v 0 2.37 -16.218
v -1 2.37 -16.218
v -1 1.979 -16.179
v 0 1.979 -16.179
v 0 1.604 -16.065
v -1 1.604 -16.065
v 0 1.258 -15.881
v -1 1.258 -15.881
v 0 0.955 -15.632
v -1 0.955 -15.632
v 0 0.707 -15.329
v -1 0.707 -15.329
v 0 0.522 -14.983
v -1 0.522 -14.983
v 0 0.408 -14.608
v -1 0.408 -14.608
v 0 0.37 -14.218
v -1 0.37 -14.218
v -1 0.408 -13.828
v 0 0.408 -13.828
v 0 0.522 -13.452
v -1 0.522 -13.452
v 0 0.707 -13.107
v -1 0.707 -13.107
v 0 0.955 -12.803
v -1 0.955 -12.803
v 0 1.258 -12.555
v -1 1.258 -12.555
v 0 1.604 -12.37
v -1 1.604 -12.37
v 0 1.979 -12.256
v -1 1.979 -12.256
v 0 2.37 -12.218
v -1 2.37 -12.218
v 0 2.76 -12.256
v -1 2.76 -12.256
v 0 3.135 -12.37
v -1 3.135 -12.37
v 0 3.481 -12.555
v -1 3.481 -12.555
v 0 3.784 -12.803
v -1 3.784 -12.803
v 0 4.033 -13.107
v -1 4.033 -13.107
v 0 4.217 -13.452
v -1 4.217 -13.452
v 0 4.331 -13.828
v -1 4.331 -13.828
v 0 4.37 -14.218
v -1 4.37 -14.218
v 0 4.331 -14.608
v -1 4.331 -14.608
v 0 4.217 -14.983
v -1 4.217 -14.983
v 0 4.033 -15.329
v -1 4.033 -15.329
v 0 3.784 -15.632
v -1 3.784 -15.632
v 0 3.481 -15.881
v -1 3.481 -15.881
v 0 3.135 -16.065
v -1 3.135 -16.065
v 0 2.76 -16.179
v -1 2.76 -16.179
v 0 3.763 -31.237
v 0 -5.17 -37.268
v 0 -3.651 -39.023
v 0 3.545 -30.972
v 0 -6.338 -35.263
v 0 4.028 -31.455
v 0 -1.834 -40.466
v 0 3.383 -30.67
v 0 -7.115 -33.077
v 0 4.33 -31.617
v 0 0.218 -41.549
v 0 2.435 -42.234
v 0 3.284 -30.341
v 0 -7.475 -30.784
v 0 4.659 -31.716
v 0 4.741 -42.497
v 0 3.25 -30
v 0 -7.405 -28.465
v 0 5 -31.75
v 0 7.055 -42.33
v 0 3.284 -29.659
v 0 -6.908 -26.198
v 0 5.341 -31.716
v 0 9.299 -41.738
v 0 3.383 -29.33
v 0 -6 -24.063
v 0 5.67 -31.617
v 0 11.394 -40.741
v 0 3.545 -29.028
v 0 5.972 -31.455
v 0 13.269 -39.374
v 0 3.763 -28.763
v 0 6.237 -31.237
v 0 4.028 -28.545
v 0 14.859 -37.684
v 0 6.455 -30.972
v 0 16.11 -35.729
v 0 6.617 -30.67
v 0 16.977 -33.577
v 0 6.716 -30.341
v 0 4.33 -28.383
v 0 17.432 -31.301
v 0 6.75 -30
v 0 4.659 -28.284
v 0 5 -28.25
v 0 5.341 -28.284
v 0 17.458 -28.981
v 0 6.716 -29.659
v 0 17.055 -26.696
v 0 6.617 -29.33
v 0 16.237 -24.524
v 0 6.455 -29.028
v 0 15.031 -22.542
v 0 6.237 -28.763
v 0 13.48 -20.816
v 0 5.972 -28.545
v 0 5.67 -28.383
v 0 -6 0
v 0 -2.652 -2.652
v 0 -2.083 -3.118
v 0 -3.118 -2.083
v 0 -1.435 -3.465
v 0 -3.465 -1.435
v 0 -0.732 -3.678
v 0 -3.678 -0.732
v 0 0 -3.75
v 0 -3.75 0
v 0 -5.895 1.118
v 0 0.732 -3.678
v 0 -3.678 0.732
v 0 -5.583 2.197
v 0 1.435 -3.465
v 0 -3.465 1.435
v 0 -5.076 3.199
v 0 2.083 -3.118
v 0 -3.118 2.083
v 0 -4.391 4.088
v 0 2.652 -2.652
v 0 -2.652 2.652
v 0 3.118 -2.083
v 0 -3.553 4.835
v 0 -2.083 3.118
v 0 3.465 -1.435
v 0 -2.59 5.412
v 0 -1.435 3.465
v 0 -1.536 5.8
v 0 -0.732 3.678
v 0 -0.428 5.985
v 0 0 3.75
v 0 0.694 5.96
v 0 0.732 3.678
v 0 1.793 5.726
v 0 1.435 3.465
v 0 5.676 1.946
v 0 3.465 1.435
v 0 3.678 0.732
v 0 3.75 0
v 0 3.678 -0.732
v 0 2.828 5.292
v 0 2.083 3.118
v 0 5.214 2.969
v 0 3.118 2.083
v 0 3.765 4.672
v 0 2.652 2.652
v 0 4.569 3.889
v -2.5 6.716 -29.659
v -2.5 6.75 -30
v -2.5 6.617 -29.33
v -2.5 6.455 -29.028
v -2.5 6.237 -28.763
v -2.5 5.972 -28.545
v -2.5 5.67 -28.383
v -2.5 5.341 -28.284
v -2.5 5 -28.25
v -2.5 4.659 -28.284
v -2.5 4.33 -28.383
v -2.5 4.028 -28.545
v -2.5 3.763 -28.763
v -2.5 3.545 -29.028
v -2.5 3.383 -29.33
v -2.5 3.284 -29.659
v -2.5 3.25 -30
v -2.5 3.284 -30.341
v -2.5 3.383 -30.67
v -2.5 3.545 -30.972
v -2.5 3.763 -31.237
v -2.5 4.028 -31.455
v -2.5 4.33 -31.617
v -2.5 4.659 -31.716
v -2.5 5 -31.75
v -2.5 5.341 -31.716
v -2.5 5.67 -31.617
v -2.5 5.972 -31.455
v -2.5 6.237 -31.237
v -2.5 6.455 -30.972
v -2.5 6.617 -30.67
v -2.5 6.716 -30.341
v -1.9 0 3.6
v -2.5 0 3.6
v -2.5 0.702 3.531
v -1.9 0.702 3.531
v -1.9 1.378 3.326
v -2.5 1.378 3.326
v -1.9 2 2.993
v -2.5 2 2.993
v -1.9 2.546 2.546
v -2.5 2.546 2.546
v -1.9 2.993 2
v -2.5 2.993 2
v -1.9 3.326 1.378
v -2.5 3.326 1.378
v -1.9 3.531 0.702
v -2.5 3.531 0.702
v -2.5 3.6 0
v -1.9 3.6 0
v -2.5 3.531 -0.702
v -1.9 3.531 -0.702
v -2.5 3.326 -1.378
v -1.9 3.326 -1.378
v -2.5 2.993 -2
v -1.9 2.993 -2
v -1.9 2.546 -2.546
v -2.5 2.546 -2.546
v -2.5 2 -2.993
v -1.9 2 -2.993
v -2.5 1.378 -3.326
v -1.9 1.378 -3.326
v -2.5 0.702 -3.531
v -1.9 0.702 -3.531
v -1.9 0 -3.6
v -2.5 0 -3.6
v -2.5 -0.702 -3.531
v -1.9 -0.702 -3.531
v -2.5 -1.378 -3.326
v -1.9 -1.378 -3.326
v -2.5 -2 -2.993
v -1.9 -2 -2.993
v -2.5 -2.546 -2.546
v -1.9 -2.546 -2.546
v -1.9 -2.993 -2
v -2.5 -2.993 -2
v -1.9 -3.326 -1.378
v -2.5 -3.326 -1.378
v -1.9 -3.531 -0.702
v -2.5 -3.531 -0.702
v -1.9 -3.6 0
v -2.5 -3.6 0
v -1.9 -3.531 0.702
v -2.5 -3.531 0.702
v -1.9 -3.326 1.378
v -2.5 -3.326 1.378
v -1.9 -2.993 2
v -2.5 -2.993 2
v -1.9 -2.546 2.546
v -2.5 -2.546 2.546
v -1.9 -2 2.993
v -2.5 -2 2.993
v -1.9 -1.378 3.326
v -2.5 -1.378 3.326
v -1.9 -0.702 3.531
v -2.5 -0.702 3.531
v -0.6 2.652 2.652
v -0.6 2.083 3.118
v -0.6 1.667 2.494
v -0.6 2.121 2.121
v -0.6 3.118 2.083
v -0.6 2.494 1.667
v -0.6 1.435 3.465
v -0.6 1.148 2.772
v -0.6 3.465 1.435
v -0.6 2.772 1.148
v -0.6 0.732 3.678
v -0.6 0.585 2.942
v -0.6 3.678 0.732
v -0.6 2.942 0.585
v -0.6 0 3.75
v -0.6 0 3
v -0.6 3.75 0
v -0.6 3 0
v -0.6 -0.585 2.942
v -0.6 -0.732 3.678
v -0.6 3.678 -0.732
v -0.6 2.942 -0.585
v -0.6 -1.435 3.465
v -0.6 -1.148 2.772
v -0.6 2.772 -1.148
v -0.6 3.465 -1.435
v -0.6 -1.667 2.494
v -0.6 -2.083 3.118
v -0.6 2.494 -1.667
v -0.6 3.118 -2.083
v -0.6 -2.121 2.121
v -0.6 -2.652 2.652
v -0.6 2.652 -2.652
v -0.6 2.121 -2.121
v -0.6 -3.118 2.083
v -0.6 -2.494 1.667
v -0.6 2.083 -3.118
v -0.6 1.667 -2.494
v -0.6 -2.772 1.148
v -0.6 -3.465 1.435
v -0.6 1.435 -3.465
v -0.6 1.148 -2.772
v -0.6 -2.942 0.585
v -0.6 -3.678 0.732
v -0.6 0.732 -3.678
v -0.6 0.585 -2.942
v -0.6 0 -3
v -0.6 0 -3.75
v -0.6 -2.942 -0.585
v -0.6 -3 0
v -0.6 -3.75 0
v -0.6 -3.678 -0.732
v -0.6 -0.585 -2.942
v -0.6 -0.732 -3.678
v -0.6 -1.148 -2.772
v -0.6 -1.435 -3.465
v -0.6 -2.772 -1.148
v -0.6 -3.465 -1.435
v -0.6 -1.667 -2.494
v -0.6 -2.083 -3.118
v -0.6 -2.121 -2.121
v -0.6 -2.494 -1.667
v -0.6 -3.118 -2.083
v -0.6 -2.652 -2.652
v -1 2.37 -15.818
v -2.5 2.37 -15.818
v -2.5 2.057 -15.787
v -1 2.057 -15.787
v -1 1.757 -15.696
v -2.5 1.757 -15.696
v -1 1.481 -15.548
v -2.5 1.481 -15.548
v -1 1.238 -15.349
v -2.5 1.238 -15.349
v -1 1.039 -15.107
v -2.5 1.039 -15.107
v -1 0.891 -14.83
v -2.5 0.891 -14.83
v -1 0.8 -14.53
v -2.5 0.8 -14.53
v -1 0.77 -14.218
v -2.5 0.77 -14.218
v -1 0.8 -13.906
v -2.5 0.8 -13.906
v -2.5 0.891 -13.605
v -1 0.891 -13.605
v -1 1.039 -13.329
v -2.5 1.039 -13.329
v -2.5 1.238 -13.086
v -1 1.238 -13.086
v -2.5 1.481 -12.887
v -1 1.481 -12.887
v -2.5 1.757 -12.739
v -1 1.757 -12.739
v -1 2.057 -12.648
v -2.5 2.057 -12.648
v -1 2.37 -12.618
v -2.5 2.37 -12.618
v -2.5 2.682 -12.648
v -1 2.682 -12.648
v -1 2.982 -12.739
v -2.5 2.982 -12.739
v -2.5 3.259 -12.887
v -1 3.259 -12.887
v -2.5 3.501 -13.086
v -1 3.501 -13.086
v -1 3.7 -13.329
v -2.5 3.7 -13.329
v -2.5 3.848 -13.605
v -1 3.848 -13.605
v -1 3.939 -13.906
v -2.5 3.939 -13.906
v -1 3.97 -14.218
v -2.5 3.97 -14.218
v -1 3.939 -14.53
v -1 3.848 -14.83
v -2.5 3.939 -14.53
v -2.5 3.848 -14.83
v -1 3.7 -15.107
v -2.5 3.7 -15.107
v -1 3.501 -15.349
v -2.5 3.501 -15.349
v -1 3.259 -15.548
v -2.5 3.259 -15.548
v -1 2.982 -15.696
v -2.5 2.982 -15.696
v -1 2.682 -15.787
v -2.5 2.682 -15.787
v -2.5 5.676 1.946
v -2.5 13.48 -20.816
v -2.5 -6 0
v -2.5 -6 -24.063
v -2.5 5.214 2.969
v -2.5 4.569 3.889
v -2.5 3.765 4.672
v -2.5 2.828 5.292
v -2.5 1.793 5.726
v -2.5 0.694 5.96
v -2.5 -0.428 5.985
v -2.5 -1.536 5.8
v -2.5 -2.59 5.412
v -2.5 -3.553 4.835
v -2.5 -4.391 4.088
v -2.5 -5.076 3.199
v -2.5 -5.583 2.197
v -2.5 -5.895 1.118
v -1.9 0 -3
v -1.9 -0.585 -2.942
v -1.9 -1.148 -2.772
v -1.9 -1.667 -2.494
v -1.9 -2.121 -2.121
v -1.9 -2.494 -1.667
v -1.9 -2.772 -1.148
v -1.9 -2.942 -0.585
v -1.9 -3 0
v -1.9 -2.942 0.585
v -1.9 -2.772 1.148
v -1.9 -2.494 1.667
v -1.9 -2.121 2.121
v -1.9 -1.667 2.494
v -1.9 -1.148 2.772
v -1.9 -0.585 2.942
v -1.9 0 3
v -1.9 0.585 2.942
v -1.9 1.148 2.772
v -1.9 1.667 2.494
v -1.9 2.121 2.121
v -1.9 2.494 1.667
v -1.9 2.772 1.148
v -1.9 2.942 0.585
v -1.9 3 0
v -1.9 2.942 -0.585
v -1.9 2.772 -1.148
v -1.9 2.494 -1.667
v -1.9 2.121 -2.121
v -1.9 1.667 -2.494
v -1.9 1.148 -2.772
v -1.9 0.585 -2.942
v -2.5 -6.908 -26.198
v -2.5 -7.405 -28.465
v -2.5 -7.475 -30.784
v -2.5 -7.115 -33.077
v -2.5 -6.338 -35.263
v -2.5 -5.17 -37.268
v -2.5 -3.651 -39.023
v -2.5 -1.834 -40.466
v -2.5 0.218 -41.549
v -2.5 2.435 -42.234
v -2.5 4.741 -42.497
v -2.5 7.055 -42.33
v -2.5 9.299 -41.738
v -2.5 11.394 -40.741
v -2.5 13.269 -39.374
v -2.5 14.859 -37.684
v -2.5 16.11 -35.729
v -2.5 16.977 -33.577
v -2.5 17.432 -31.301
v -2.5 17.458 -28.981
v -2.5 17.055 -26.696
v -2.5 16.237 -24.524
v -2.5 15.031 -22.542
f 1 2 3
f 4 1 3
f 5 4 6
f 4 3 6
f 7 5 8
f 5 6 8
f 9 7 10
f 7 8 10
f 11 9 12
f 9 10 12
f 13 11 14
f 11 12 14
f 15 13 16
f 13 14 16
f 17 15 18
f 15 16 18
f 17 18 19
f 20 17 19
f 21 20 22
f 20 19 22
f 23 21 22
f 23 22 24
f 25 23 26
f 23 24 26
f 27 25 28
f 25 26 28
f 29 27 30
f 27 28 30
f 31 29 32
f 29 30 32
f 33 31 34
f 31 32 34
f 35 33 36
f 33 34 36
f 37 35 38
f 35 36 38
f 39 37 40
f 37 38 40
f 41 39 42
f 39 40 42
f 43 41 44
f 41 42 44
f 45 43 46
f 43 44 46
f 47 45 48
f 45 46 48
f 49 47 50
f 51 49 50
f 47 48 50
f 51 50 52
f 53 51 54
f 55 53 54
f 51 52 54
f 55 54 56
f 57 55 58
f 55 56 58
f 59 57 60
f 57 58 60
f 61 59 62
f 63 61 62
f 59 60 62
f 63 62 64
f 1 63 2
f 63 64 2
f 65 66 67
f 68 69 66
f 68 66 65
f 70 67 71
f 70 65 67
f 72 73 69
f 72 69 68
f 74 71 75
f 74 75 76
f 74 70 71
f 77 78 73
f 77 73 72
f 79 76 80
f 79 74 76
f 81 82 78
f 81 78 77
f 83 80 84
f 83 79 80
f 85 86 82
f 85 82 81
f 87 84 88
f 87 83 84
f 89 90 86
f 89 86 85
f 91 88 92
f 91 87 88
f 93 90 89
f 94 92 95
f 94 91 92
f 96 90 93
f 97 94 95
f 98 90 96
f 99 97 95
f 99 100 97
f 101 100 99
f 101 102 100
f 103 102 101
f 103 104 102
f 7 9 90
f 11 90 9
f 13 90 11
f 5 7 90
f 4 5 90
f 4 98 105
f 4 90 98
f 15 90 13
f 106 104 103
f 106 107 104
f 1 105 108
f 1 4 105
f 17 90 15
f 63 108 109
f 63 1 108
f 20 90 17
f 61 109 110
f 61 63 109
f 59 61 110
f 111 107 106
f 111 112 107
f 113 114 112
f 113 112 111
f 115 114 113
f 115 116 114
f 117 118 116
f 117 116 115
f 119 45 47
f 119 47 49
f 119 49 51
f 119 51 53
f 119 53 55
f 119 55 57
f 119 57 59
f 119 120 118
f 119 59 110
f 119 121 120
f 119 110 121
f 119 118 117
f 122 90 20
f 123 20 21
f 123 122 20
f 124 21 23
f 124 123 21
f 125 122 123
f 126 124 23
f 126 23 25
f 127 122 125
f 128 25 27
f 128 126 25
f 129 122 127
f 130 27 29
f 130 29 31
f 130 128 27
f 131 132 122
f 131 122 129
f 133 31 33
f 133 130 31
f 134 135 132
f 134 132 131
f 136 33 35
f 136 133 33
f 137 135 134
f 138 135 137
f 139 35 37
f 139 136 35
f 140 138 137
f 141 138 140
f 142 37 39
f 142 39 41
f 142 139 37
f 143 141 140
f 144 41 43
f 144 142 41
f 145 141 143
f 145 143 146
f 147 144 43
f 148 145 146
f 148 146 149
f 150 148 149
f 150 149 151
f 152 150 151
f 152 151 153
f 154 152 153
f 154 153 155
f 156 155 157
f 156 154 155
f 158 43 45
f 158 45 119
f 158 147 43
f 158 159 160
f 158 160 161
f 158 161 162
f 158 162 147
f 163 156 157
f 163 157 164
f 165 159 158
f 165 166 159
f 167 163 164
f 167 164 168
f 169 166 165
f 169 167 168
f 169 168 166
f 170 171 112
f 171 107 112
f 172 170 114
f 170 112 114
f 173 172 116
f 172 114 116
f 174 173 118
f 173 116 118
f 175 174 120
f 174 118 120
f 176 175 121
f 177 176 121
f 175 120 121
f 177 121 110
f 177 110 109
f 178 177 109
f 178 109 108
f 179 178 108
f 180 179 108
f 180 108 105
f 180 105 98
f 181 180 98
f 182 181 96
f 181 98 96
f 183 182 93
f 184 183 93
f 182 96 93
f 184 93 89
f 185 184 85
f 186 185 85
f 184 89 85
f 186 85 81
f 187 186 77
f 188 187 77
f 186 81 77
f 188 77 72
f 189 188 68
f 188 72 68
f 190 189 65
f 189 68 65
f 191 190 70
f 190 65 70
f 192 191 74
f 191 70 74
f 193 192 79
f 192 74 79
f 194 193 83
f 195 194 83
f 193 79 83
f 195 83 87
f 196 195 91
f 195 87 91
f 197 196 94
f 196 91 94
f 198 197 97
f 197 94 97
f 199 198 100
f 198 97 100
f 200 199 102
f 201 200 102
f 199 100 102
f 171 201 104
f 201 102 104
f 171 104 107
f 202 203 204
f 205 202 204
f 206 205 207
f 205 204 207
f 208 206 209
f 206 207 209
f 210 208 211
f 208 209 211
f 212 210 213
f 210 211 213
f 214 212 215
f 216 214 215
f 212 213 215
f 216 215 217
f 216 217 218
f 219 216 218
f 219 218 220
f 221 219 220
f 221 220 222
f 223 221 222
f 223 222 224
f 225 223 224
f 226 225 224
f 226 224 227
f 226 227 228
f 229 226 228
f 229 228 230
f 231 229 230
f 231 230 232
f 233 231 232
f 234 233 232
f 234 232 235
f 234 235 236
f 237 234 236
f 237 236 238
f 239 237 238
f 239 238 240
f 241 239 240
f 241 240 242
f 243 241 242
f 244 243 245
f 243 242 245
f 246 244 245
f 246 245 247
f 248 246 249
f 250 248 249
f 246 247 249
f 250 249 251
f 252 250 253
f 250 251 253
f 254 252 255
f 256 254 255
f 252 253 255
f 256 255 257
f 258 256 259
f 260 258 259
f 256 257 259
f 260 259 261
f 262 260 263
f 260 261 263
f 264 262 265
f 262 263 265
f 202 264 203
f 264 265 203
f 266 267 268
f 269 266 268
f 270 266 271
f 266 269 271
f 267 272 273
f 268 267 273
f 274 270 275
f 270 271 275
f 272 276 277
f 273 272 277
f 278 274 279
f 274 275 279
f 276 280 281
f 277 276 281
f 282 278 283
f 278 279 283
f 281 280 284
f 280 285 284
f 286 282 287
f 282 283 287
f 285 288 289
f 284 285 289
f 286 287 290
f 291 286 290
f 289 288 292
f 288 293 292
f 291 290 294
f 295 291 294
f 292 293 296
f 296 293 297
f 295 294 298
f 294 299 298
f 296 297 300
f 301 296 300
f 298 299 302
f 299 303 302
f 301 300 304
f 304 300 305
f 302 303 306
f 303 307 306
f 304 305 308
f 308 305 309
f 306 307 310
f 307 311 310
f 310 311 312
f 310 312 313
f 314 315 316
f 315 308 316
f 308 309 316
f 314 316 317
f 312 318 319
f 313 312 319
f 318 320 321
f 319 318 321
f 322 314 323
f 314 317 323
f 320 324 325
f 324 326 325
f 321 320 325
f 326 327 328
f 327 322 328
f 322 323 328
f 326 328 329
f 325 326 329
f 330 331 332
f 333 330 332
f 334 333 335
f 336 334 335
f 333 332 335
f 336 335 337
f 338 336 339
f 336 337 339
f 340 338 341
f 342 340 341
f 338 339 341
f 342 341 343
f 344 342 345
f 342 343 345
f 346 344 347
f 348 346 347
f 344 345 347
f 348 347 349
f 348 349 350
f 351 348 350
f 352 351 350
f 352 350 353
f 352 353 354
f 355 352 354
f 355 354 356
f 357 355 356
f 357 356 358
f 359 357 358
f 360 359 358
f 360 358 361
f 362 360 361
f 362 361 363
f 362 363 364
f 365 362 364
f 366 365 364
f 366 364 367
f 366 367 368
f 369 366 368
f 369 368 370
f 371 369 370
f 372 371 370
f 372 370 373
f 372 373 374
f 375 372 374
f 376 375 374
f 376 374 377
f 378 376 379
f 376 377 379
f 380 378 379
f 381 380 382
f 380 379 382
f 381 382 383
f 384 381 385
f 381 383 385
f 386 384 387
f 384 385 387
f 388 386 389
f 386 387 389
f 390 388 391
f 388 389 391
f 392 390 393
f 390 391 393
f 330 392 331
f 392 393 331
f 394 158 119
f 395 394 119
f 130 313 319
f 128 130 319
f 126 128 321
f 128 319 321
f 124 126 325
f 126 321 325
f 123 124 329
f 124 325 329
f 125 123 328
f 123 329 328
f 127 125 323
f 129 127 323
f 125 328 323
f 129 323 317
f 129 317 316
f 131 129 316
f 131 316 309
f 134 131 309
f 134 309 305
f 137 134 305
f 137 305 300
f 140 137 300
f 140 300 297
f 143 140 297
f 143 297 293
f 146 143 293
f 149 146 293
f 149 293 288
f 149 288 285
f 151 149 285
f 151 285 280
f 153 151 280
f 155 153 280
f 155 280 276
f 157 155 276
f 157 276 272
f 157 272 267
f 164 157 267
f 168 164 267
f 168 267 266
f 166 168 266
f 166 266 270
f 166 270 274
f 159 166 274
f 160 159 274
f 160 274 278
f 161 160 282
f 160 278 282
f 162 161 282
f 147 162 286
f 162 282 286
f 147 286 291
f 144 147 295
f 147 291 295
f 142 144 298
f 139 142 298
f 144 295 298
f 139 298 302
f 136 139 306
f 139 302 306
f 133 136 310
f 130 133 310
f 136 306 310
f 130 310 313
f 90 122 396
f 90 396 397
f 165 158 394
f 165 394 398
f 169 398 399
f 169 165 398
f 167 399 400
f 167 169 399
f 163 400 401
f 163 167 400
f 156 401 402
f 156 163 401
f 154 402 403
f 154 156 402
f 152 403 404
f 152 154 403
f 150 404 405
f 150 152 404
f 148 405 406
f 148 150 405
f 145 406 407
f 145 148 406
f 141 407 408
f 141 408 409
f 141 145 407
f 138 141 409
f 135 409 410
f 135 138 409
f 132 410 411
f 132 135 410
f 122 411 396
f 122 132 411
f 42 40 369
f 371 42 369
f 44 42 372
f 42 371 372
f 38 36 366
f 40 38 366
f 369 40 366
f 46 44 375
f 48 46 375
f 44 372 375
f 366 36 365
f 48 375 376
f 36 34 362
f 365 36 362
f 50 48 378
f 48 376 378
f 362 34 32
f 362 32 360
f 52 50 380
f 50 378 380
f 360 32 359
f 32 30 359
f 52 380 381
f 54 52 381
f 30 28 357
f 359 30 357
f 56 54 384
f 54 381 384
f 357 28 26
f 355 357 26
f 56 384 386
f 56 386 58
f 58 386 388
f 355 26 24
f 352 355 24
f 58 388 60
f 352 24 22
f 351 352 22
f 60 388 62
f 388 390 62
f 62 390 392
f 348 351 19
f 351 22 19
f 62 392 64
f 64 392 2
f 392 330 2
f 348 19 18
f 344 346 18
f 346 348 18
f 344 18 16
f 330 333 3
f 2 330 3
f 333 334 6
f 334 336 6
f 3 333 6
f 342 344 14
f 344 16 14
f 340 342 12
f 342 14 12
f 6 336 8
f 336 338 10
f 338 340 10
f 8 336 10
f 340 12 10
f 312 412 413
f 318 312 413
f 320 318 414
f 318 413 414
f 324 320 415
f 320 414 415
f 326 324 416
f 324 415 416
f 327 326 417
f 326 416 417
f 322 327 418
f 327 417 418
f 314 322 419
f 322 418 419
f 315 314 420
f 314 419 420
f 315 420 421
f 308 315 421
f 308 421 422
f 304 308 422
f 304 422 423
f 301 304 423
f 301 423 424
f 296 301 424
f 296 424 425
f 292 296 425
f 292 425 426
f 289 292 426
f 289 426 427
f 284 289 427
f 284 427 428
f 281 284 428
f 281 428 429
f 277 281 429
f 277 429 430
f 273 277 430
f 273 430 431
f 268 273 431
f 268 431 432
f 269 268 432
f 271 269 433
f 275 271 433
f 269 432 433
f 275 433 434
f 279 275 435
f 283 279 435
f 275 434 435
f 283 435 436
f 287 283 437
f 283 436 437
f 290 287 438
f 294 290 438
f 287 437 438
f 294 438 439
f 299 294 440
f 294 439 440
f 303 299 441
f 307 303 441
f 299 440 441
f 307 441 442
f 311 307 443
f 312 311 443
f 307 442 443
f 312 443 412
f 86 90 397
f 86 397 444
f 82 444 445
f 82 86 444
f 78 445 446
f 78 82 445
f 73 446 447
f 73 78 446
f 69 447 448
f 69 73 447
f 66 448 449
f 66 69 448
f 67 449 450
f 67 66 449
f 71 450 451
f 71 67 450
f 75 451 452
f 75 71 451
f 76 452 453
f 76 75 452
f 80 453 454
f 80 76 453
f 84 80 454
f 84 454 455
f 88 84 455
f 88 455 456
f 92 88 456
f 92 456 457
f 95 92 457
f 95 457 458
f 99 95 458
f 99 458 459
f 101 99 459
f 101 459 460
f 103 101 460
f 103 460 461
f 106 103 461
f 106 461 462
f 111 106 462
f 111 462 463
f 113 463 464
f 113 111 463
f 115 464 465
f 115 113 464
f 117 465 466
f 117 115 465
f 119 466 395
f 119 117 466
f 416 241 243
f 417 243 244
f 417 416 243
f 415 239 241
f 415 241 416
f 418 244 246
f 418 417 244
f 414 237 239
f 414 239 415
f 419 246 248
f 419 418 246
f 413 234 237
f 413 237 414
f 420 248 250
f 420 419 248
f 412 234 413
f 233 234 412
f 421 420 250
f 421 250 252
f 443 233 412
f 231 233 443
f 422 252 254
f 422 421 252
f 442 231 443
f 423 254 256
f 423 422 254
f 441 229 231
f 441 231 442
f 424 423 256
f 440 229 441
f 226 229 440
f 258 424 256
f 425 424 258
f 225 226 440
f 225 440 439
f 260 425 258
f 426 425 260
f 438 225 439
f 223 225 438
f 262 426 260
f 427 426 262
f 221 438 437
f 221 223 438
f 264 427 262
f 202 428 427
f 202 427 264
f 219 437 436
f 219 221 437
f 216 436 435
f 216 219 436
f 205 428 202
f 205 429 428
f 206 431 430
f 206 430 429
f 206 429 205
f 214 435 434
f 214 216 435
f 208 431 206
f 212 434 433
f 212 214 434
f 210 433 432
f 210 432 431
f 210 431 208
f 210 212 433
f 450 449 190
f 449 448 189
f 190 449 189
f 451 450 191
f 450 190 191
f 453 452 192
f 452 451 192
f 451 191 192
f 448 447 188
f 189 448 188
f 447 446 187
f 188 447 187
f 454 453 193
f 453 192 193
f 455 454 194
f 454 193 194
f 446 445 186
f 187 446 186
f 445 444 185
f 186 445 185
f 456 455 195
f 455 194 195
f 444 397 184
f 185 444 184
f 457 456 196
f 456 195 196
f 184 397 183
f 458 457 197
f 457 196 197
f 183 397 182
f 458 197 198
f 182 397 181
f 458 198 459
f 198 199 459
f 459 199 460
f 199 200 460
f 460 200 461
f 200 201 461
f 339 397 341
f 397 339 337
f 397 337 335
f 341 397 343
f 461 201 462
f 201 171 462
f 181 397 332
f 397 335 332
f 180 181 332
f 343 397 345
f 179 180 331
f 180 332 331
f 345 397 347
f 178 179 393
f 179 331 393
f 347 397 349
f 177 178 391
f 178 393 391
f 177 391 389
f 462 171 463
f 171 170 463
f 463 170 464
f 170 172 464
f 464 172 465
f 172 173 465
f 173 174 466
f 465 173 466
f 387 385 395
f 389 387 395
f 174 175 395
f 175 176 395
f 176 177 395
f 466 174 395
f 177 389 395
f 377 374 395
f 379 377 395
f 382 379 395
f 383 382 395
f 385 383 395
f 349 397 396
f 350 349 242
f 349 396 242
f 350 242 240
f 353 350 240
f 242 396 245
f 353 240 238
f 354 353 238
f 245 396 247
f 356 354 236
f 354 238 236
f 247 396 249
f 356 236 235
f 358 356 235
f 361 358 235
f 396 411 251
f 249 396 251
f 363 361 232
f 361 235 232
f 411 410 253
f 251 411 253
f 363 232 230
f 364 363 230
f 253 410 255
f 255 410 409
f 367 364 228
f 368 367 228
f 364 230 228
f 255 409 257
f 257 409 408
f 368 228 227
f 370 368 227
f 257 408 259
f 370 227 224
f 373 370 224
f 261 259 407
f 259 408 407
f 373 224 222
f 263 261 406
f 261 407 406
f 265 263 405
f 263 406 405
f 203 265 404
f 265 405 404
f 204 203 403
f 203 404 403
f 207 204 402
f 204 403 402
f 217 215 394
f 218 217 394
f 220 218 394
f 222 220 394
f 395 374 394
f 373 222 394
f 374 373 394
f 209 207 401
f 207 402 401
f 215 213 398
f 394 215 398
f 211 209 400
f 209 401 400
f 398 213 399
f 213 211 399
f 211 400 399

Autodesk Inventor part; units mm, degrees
ref_plane "YZ Plane" through (0, 0, 0) normal (1, 0, 0) x (0, 1, 0)
ref_plane "XZ Plane" through (0, 0, 0) normal (0, 1, 0) x (-1, 0, 0)
ref_plane "XY Plane" through (0, 0, 0) normal (0, 0, 1) x (1, 0, 0)
sketch "スケッチ1" plane through (0, 0, 0) normal (1, 0, 0) x (0, 1, 0)
  circle A0 centre (0, 0) radius 6
  circle A1 centre (5, -30) radius 11
  line L0 (-6, 0) -> (-6, -30)
  line L1 (5.6757, 1.9459) -> (15.4054, -26.4324)
  circle A2 centre (5, -30) radius 12.5
  circle A3 centre (0, 0) radius 3
  circle A4 centre (5, -30) radius 1.75
  line L2 (5, -30) -> (5, -41) construction
  circle A5 centre (0, 0) radius 4.5 construction
  circle A6 centre (5, -30) radius 2.5 construction
  line L3 (4.4778, 0.4463) -> (7.4877, -29.7521) construction
  line L4 (2.5664, -30.5723) -> (-4.3805, -1.0301) construction
  circle A7 centre (2.3696, -14.2177) radius 2
  circle A8 centre (2.3696, -14.2177) radius 1
  circle A9 centre (2.3696, -14.2177) radius 3.5522 construction
  line L5 (9.4297, -56.5784) -> (-3.4387, 20.6324) construction
  circle A10 centre (5, -30) radius 14 construction
  point P0 (-6, -24.0628)
  point P1 (13.4798, -20.8162)
  point P2 (15.9919, -30.4228)
  point P3 (-1.7415, -38.692)
  point P4 (13.8604, -21.1828)
  point P5 (-6.4987, -25.098)
  dimension "d0" = 12
  dimension "d1" = 22
  dimension "d2" = 30
  dimension "d3" = 25
  dimension "d4" = 6
  dimension "d5" = 3.5
  dimension "d21" = 9
  dimension "d22" = 5
  dimension "d23" = 2
  dimension "d24" = 4
  dimension "d35" = 28
extrude "押し出し1" add sketch "スケッチ1" against normal blind 2.5 contours A0 | A0 L1 A2 L0 | A2 L0 A1 L1 | L1 A1 L0 A2 | A1 | A3 | A7 | A8
sketch "スケッチ2" plane through (-2.5, 0, 0) normal (-1, 0, 0) x (0, 0, 1)
  circle A0 centre (0, 0) radius 3.6
  circle A1 centre (0, 0) radius 3 projected
  dimension "d8" = 7.2
extrude "押し出し2" cut sketch "スケッチ2" against normal blind 0.6
hole "穴1" at (0, 2.3696, -14.2177) direction (-1, 0, 0) diameter 3.2 end through all counterbore diameter 4 counterbore depth 1
hole "穴2" at (0, 0, 0) direction (-1, 0, 0) diameter 6 end through all counterbore diameter 7.5 counterbore depth 0.6
properties part number "Main_Frame"
